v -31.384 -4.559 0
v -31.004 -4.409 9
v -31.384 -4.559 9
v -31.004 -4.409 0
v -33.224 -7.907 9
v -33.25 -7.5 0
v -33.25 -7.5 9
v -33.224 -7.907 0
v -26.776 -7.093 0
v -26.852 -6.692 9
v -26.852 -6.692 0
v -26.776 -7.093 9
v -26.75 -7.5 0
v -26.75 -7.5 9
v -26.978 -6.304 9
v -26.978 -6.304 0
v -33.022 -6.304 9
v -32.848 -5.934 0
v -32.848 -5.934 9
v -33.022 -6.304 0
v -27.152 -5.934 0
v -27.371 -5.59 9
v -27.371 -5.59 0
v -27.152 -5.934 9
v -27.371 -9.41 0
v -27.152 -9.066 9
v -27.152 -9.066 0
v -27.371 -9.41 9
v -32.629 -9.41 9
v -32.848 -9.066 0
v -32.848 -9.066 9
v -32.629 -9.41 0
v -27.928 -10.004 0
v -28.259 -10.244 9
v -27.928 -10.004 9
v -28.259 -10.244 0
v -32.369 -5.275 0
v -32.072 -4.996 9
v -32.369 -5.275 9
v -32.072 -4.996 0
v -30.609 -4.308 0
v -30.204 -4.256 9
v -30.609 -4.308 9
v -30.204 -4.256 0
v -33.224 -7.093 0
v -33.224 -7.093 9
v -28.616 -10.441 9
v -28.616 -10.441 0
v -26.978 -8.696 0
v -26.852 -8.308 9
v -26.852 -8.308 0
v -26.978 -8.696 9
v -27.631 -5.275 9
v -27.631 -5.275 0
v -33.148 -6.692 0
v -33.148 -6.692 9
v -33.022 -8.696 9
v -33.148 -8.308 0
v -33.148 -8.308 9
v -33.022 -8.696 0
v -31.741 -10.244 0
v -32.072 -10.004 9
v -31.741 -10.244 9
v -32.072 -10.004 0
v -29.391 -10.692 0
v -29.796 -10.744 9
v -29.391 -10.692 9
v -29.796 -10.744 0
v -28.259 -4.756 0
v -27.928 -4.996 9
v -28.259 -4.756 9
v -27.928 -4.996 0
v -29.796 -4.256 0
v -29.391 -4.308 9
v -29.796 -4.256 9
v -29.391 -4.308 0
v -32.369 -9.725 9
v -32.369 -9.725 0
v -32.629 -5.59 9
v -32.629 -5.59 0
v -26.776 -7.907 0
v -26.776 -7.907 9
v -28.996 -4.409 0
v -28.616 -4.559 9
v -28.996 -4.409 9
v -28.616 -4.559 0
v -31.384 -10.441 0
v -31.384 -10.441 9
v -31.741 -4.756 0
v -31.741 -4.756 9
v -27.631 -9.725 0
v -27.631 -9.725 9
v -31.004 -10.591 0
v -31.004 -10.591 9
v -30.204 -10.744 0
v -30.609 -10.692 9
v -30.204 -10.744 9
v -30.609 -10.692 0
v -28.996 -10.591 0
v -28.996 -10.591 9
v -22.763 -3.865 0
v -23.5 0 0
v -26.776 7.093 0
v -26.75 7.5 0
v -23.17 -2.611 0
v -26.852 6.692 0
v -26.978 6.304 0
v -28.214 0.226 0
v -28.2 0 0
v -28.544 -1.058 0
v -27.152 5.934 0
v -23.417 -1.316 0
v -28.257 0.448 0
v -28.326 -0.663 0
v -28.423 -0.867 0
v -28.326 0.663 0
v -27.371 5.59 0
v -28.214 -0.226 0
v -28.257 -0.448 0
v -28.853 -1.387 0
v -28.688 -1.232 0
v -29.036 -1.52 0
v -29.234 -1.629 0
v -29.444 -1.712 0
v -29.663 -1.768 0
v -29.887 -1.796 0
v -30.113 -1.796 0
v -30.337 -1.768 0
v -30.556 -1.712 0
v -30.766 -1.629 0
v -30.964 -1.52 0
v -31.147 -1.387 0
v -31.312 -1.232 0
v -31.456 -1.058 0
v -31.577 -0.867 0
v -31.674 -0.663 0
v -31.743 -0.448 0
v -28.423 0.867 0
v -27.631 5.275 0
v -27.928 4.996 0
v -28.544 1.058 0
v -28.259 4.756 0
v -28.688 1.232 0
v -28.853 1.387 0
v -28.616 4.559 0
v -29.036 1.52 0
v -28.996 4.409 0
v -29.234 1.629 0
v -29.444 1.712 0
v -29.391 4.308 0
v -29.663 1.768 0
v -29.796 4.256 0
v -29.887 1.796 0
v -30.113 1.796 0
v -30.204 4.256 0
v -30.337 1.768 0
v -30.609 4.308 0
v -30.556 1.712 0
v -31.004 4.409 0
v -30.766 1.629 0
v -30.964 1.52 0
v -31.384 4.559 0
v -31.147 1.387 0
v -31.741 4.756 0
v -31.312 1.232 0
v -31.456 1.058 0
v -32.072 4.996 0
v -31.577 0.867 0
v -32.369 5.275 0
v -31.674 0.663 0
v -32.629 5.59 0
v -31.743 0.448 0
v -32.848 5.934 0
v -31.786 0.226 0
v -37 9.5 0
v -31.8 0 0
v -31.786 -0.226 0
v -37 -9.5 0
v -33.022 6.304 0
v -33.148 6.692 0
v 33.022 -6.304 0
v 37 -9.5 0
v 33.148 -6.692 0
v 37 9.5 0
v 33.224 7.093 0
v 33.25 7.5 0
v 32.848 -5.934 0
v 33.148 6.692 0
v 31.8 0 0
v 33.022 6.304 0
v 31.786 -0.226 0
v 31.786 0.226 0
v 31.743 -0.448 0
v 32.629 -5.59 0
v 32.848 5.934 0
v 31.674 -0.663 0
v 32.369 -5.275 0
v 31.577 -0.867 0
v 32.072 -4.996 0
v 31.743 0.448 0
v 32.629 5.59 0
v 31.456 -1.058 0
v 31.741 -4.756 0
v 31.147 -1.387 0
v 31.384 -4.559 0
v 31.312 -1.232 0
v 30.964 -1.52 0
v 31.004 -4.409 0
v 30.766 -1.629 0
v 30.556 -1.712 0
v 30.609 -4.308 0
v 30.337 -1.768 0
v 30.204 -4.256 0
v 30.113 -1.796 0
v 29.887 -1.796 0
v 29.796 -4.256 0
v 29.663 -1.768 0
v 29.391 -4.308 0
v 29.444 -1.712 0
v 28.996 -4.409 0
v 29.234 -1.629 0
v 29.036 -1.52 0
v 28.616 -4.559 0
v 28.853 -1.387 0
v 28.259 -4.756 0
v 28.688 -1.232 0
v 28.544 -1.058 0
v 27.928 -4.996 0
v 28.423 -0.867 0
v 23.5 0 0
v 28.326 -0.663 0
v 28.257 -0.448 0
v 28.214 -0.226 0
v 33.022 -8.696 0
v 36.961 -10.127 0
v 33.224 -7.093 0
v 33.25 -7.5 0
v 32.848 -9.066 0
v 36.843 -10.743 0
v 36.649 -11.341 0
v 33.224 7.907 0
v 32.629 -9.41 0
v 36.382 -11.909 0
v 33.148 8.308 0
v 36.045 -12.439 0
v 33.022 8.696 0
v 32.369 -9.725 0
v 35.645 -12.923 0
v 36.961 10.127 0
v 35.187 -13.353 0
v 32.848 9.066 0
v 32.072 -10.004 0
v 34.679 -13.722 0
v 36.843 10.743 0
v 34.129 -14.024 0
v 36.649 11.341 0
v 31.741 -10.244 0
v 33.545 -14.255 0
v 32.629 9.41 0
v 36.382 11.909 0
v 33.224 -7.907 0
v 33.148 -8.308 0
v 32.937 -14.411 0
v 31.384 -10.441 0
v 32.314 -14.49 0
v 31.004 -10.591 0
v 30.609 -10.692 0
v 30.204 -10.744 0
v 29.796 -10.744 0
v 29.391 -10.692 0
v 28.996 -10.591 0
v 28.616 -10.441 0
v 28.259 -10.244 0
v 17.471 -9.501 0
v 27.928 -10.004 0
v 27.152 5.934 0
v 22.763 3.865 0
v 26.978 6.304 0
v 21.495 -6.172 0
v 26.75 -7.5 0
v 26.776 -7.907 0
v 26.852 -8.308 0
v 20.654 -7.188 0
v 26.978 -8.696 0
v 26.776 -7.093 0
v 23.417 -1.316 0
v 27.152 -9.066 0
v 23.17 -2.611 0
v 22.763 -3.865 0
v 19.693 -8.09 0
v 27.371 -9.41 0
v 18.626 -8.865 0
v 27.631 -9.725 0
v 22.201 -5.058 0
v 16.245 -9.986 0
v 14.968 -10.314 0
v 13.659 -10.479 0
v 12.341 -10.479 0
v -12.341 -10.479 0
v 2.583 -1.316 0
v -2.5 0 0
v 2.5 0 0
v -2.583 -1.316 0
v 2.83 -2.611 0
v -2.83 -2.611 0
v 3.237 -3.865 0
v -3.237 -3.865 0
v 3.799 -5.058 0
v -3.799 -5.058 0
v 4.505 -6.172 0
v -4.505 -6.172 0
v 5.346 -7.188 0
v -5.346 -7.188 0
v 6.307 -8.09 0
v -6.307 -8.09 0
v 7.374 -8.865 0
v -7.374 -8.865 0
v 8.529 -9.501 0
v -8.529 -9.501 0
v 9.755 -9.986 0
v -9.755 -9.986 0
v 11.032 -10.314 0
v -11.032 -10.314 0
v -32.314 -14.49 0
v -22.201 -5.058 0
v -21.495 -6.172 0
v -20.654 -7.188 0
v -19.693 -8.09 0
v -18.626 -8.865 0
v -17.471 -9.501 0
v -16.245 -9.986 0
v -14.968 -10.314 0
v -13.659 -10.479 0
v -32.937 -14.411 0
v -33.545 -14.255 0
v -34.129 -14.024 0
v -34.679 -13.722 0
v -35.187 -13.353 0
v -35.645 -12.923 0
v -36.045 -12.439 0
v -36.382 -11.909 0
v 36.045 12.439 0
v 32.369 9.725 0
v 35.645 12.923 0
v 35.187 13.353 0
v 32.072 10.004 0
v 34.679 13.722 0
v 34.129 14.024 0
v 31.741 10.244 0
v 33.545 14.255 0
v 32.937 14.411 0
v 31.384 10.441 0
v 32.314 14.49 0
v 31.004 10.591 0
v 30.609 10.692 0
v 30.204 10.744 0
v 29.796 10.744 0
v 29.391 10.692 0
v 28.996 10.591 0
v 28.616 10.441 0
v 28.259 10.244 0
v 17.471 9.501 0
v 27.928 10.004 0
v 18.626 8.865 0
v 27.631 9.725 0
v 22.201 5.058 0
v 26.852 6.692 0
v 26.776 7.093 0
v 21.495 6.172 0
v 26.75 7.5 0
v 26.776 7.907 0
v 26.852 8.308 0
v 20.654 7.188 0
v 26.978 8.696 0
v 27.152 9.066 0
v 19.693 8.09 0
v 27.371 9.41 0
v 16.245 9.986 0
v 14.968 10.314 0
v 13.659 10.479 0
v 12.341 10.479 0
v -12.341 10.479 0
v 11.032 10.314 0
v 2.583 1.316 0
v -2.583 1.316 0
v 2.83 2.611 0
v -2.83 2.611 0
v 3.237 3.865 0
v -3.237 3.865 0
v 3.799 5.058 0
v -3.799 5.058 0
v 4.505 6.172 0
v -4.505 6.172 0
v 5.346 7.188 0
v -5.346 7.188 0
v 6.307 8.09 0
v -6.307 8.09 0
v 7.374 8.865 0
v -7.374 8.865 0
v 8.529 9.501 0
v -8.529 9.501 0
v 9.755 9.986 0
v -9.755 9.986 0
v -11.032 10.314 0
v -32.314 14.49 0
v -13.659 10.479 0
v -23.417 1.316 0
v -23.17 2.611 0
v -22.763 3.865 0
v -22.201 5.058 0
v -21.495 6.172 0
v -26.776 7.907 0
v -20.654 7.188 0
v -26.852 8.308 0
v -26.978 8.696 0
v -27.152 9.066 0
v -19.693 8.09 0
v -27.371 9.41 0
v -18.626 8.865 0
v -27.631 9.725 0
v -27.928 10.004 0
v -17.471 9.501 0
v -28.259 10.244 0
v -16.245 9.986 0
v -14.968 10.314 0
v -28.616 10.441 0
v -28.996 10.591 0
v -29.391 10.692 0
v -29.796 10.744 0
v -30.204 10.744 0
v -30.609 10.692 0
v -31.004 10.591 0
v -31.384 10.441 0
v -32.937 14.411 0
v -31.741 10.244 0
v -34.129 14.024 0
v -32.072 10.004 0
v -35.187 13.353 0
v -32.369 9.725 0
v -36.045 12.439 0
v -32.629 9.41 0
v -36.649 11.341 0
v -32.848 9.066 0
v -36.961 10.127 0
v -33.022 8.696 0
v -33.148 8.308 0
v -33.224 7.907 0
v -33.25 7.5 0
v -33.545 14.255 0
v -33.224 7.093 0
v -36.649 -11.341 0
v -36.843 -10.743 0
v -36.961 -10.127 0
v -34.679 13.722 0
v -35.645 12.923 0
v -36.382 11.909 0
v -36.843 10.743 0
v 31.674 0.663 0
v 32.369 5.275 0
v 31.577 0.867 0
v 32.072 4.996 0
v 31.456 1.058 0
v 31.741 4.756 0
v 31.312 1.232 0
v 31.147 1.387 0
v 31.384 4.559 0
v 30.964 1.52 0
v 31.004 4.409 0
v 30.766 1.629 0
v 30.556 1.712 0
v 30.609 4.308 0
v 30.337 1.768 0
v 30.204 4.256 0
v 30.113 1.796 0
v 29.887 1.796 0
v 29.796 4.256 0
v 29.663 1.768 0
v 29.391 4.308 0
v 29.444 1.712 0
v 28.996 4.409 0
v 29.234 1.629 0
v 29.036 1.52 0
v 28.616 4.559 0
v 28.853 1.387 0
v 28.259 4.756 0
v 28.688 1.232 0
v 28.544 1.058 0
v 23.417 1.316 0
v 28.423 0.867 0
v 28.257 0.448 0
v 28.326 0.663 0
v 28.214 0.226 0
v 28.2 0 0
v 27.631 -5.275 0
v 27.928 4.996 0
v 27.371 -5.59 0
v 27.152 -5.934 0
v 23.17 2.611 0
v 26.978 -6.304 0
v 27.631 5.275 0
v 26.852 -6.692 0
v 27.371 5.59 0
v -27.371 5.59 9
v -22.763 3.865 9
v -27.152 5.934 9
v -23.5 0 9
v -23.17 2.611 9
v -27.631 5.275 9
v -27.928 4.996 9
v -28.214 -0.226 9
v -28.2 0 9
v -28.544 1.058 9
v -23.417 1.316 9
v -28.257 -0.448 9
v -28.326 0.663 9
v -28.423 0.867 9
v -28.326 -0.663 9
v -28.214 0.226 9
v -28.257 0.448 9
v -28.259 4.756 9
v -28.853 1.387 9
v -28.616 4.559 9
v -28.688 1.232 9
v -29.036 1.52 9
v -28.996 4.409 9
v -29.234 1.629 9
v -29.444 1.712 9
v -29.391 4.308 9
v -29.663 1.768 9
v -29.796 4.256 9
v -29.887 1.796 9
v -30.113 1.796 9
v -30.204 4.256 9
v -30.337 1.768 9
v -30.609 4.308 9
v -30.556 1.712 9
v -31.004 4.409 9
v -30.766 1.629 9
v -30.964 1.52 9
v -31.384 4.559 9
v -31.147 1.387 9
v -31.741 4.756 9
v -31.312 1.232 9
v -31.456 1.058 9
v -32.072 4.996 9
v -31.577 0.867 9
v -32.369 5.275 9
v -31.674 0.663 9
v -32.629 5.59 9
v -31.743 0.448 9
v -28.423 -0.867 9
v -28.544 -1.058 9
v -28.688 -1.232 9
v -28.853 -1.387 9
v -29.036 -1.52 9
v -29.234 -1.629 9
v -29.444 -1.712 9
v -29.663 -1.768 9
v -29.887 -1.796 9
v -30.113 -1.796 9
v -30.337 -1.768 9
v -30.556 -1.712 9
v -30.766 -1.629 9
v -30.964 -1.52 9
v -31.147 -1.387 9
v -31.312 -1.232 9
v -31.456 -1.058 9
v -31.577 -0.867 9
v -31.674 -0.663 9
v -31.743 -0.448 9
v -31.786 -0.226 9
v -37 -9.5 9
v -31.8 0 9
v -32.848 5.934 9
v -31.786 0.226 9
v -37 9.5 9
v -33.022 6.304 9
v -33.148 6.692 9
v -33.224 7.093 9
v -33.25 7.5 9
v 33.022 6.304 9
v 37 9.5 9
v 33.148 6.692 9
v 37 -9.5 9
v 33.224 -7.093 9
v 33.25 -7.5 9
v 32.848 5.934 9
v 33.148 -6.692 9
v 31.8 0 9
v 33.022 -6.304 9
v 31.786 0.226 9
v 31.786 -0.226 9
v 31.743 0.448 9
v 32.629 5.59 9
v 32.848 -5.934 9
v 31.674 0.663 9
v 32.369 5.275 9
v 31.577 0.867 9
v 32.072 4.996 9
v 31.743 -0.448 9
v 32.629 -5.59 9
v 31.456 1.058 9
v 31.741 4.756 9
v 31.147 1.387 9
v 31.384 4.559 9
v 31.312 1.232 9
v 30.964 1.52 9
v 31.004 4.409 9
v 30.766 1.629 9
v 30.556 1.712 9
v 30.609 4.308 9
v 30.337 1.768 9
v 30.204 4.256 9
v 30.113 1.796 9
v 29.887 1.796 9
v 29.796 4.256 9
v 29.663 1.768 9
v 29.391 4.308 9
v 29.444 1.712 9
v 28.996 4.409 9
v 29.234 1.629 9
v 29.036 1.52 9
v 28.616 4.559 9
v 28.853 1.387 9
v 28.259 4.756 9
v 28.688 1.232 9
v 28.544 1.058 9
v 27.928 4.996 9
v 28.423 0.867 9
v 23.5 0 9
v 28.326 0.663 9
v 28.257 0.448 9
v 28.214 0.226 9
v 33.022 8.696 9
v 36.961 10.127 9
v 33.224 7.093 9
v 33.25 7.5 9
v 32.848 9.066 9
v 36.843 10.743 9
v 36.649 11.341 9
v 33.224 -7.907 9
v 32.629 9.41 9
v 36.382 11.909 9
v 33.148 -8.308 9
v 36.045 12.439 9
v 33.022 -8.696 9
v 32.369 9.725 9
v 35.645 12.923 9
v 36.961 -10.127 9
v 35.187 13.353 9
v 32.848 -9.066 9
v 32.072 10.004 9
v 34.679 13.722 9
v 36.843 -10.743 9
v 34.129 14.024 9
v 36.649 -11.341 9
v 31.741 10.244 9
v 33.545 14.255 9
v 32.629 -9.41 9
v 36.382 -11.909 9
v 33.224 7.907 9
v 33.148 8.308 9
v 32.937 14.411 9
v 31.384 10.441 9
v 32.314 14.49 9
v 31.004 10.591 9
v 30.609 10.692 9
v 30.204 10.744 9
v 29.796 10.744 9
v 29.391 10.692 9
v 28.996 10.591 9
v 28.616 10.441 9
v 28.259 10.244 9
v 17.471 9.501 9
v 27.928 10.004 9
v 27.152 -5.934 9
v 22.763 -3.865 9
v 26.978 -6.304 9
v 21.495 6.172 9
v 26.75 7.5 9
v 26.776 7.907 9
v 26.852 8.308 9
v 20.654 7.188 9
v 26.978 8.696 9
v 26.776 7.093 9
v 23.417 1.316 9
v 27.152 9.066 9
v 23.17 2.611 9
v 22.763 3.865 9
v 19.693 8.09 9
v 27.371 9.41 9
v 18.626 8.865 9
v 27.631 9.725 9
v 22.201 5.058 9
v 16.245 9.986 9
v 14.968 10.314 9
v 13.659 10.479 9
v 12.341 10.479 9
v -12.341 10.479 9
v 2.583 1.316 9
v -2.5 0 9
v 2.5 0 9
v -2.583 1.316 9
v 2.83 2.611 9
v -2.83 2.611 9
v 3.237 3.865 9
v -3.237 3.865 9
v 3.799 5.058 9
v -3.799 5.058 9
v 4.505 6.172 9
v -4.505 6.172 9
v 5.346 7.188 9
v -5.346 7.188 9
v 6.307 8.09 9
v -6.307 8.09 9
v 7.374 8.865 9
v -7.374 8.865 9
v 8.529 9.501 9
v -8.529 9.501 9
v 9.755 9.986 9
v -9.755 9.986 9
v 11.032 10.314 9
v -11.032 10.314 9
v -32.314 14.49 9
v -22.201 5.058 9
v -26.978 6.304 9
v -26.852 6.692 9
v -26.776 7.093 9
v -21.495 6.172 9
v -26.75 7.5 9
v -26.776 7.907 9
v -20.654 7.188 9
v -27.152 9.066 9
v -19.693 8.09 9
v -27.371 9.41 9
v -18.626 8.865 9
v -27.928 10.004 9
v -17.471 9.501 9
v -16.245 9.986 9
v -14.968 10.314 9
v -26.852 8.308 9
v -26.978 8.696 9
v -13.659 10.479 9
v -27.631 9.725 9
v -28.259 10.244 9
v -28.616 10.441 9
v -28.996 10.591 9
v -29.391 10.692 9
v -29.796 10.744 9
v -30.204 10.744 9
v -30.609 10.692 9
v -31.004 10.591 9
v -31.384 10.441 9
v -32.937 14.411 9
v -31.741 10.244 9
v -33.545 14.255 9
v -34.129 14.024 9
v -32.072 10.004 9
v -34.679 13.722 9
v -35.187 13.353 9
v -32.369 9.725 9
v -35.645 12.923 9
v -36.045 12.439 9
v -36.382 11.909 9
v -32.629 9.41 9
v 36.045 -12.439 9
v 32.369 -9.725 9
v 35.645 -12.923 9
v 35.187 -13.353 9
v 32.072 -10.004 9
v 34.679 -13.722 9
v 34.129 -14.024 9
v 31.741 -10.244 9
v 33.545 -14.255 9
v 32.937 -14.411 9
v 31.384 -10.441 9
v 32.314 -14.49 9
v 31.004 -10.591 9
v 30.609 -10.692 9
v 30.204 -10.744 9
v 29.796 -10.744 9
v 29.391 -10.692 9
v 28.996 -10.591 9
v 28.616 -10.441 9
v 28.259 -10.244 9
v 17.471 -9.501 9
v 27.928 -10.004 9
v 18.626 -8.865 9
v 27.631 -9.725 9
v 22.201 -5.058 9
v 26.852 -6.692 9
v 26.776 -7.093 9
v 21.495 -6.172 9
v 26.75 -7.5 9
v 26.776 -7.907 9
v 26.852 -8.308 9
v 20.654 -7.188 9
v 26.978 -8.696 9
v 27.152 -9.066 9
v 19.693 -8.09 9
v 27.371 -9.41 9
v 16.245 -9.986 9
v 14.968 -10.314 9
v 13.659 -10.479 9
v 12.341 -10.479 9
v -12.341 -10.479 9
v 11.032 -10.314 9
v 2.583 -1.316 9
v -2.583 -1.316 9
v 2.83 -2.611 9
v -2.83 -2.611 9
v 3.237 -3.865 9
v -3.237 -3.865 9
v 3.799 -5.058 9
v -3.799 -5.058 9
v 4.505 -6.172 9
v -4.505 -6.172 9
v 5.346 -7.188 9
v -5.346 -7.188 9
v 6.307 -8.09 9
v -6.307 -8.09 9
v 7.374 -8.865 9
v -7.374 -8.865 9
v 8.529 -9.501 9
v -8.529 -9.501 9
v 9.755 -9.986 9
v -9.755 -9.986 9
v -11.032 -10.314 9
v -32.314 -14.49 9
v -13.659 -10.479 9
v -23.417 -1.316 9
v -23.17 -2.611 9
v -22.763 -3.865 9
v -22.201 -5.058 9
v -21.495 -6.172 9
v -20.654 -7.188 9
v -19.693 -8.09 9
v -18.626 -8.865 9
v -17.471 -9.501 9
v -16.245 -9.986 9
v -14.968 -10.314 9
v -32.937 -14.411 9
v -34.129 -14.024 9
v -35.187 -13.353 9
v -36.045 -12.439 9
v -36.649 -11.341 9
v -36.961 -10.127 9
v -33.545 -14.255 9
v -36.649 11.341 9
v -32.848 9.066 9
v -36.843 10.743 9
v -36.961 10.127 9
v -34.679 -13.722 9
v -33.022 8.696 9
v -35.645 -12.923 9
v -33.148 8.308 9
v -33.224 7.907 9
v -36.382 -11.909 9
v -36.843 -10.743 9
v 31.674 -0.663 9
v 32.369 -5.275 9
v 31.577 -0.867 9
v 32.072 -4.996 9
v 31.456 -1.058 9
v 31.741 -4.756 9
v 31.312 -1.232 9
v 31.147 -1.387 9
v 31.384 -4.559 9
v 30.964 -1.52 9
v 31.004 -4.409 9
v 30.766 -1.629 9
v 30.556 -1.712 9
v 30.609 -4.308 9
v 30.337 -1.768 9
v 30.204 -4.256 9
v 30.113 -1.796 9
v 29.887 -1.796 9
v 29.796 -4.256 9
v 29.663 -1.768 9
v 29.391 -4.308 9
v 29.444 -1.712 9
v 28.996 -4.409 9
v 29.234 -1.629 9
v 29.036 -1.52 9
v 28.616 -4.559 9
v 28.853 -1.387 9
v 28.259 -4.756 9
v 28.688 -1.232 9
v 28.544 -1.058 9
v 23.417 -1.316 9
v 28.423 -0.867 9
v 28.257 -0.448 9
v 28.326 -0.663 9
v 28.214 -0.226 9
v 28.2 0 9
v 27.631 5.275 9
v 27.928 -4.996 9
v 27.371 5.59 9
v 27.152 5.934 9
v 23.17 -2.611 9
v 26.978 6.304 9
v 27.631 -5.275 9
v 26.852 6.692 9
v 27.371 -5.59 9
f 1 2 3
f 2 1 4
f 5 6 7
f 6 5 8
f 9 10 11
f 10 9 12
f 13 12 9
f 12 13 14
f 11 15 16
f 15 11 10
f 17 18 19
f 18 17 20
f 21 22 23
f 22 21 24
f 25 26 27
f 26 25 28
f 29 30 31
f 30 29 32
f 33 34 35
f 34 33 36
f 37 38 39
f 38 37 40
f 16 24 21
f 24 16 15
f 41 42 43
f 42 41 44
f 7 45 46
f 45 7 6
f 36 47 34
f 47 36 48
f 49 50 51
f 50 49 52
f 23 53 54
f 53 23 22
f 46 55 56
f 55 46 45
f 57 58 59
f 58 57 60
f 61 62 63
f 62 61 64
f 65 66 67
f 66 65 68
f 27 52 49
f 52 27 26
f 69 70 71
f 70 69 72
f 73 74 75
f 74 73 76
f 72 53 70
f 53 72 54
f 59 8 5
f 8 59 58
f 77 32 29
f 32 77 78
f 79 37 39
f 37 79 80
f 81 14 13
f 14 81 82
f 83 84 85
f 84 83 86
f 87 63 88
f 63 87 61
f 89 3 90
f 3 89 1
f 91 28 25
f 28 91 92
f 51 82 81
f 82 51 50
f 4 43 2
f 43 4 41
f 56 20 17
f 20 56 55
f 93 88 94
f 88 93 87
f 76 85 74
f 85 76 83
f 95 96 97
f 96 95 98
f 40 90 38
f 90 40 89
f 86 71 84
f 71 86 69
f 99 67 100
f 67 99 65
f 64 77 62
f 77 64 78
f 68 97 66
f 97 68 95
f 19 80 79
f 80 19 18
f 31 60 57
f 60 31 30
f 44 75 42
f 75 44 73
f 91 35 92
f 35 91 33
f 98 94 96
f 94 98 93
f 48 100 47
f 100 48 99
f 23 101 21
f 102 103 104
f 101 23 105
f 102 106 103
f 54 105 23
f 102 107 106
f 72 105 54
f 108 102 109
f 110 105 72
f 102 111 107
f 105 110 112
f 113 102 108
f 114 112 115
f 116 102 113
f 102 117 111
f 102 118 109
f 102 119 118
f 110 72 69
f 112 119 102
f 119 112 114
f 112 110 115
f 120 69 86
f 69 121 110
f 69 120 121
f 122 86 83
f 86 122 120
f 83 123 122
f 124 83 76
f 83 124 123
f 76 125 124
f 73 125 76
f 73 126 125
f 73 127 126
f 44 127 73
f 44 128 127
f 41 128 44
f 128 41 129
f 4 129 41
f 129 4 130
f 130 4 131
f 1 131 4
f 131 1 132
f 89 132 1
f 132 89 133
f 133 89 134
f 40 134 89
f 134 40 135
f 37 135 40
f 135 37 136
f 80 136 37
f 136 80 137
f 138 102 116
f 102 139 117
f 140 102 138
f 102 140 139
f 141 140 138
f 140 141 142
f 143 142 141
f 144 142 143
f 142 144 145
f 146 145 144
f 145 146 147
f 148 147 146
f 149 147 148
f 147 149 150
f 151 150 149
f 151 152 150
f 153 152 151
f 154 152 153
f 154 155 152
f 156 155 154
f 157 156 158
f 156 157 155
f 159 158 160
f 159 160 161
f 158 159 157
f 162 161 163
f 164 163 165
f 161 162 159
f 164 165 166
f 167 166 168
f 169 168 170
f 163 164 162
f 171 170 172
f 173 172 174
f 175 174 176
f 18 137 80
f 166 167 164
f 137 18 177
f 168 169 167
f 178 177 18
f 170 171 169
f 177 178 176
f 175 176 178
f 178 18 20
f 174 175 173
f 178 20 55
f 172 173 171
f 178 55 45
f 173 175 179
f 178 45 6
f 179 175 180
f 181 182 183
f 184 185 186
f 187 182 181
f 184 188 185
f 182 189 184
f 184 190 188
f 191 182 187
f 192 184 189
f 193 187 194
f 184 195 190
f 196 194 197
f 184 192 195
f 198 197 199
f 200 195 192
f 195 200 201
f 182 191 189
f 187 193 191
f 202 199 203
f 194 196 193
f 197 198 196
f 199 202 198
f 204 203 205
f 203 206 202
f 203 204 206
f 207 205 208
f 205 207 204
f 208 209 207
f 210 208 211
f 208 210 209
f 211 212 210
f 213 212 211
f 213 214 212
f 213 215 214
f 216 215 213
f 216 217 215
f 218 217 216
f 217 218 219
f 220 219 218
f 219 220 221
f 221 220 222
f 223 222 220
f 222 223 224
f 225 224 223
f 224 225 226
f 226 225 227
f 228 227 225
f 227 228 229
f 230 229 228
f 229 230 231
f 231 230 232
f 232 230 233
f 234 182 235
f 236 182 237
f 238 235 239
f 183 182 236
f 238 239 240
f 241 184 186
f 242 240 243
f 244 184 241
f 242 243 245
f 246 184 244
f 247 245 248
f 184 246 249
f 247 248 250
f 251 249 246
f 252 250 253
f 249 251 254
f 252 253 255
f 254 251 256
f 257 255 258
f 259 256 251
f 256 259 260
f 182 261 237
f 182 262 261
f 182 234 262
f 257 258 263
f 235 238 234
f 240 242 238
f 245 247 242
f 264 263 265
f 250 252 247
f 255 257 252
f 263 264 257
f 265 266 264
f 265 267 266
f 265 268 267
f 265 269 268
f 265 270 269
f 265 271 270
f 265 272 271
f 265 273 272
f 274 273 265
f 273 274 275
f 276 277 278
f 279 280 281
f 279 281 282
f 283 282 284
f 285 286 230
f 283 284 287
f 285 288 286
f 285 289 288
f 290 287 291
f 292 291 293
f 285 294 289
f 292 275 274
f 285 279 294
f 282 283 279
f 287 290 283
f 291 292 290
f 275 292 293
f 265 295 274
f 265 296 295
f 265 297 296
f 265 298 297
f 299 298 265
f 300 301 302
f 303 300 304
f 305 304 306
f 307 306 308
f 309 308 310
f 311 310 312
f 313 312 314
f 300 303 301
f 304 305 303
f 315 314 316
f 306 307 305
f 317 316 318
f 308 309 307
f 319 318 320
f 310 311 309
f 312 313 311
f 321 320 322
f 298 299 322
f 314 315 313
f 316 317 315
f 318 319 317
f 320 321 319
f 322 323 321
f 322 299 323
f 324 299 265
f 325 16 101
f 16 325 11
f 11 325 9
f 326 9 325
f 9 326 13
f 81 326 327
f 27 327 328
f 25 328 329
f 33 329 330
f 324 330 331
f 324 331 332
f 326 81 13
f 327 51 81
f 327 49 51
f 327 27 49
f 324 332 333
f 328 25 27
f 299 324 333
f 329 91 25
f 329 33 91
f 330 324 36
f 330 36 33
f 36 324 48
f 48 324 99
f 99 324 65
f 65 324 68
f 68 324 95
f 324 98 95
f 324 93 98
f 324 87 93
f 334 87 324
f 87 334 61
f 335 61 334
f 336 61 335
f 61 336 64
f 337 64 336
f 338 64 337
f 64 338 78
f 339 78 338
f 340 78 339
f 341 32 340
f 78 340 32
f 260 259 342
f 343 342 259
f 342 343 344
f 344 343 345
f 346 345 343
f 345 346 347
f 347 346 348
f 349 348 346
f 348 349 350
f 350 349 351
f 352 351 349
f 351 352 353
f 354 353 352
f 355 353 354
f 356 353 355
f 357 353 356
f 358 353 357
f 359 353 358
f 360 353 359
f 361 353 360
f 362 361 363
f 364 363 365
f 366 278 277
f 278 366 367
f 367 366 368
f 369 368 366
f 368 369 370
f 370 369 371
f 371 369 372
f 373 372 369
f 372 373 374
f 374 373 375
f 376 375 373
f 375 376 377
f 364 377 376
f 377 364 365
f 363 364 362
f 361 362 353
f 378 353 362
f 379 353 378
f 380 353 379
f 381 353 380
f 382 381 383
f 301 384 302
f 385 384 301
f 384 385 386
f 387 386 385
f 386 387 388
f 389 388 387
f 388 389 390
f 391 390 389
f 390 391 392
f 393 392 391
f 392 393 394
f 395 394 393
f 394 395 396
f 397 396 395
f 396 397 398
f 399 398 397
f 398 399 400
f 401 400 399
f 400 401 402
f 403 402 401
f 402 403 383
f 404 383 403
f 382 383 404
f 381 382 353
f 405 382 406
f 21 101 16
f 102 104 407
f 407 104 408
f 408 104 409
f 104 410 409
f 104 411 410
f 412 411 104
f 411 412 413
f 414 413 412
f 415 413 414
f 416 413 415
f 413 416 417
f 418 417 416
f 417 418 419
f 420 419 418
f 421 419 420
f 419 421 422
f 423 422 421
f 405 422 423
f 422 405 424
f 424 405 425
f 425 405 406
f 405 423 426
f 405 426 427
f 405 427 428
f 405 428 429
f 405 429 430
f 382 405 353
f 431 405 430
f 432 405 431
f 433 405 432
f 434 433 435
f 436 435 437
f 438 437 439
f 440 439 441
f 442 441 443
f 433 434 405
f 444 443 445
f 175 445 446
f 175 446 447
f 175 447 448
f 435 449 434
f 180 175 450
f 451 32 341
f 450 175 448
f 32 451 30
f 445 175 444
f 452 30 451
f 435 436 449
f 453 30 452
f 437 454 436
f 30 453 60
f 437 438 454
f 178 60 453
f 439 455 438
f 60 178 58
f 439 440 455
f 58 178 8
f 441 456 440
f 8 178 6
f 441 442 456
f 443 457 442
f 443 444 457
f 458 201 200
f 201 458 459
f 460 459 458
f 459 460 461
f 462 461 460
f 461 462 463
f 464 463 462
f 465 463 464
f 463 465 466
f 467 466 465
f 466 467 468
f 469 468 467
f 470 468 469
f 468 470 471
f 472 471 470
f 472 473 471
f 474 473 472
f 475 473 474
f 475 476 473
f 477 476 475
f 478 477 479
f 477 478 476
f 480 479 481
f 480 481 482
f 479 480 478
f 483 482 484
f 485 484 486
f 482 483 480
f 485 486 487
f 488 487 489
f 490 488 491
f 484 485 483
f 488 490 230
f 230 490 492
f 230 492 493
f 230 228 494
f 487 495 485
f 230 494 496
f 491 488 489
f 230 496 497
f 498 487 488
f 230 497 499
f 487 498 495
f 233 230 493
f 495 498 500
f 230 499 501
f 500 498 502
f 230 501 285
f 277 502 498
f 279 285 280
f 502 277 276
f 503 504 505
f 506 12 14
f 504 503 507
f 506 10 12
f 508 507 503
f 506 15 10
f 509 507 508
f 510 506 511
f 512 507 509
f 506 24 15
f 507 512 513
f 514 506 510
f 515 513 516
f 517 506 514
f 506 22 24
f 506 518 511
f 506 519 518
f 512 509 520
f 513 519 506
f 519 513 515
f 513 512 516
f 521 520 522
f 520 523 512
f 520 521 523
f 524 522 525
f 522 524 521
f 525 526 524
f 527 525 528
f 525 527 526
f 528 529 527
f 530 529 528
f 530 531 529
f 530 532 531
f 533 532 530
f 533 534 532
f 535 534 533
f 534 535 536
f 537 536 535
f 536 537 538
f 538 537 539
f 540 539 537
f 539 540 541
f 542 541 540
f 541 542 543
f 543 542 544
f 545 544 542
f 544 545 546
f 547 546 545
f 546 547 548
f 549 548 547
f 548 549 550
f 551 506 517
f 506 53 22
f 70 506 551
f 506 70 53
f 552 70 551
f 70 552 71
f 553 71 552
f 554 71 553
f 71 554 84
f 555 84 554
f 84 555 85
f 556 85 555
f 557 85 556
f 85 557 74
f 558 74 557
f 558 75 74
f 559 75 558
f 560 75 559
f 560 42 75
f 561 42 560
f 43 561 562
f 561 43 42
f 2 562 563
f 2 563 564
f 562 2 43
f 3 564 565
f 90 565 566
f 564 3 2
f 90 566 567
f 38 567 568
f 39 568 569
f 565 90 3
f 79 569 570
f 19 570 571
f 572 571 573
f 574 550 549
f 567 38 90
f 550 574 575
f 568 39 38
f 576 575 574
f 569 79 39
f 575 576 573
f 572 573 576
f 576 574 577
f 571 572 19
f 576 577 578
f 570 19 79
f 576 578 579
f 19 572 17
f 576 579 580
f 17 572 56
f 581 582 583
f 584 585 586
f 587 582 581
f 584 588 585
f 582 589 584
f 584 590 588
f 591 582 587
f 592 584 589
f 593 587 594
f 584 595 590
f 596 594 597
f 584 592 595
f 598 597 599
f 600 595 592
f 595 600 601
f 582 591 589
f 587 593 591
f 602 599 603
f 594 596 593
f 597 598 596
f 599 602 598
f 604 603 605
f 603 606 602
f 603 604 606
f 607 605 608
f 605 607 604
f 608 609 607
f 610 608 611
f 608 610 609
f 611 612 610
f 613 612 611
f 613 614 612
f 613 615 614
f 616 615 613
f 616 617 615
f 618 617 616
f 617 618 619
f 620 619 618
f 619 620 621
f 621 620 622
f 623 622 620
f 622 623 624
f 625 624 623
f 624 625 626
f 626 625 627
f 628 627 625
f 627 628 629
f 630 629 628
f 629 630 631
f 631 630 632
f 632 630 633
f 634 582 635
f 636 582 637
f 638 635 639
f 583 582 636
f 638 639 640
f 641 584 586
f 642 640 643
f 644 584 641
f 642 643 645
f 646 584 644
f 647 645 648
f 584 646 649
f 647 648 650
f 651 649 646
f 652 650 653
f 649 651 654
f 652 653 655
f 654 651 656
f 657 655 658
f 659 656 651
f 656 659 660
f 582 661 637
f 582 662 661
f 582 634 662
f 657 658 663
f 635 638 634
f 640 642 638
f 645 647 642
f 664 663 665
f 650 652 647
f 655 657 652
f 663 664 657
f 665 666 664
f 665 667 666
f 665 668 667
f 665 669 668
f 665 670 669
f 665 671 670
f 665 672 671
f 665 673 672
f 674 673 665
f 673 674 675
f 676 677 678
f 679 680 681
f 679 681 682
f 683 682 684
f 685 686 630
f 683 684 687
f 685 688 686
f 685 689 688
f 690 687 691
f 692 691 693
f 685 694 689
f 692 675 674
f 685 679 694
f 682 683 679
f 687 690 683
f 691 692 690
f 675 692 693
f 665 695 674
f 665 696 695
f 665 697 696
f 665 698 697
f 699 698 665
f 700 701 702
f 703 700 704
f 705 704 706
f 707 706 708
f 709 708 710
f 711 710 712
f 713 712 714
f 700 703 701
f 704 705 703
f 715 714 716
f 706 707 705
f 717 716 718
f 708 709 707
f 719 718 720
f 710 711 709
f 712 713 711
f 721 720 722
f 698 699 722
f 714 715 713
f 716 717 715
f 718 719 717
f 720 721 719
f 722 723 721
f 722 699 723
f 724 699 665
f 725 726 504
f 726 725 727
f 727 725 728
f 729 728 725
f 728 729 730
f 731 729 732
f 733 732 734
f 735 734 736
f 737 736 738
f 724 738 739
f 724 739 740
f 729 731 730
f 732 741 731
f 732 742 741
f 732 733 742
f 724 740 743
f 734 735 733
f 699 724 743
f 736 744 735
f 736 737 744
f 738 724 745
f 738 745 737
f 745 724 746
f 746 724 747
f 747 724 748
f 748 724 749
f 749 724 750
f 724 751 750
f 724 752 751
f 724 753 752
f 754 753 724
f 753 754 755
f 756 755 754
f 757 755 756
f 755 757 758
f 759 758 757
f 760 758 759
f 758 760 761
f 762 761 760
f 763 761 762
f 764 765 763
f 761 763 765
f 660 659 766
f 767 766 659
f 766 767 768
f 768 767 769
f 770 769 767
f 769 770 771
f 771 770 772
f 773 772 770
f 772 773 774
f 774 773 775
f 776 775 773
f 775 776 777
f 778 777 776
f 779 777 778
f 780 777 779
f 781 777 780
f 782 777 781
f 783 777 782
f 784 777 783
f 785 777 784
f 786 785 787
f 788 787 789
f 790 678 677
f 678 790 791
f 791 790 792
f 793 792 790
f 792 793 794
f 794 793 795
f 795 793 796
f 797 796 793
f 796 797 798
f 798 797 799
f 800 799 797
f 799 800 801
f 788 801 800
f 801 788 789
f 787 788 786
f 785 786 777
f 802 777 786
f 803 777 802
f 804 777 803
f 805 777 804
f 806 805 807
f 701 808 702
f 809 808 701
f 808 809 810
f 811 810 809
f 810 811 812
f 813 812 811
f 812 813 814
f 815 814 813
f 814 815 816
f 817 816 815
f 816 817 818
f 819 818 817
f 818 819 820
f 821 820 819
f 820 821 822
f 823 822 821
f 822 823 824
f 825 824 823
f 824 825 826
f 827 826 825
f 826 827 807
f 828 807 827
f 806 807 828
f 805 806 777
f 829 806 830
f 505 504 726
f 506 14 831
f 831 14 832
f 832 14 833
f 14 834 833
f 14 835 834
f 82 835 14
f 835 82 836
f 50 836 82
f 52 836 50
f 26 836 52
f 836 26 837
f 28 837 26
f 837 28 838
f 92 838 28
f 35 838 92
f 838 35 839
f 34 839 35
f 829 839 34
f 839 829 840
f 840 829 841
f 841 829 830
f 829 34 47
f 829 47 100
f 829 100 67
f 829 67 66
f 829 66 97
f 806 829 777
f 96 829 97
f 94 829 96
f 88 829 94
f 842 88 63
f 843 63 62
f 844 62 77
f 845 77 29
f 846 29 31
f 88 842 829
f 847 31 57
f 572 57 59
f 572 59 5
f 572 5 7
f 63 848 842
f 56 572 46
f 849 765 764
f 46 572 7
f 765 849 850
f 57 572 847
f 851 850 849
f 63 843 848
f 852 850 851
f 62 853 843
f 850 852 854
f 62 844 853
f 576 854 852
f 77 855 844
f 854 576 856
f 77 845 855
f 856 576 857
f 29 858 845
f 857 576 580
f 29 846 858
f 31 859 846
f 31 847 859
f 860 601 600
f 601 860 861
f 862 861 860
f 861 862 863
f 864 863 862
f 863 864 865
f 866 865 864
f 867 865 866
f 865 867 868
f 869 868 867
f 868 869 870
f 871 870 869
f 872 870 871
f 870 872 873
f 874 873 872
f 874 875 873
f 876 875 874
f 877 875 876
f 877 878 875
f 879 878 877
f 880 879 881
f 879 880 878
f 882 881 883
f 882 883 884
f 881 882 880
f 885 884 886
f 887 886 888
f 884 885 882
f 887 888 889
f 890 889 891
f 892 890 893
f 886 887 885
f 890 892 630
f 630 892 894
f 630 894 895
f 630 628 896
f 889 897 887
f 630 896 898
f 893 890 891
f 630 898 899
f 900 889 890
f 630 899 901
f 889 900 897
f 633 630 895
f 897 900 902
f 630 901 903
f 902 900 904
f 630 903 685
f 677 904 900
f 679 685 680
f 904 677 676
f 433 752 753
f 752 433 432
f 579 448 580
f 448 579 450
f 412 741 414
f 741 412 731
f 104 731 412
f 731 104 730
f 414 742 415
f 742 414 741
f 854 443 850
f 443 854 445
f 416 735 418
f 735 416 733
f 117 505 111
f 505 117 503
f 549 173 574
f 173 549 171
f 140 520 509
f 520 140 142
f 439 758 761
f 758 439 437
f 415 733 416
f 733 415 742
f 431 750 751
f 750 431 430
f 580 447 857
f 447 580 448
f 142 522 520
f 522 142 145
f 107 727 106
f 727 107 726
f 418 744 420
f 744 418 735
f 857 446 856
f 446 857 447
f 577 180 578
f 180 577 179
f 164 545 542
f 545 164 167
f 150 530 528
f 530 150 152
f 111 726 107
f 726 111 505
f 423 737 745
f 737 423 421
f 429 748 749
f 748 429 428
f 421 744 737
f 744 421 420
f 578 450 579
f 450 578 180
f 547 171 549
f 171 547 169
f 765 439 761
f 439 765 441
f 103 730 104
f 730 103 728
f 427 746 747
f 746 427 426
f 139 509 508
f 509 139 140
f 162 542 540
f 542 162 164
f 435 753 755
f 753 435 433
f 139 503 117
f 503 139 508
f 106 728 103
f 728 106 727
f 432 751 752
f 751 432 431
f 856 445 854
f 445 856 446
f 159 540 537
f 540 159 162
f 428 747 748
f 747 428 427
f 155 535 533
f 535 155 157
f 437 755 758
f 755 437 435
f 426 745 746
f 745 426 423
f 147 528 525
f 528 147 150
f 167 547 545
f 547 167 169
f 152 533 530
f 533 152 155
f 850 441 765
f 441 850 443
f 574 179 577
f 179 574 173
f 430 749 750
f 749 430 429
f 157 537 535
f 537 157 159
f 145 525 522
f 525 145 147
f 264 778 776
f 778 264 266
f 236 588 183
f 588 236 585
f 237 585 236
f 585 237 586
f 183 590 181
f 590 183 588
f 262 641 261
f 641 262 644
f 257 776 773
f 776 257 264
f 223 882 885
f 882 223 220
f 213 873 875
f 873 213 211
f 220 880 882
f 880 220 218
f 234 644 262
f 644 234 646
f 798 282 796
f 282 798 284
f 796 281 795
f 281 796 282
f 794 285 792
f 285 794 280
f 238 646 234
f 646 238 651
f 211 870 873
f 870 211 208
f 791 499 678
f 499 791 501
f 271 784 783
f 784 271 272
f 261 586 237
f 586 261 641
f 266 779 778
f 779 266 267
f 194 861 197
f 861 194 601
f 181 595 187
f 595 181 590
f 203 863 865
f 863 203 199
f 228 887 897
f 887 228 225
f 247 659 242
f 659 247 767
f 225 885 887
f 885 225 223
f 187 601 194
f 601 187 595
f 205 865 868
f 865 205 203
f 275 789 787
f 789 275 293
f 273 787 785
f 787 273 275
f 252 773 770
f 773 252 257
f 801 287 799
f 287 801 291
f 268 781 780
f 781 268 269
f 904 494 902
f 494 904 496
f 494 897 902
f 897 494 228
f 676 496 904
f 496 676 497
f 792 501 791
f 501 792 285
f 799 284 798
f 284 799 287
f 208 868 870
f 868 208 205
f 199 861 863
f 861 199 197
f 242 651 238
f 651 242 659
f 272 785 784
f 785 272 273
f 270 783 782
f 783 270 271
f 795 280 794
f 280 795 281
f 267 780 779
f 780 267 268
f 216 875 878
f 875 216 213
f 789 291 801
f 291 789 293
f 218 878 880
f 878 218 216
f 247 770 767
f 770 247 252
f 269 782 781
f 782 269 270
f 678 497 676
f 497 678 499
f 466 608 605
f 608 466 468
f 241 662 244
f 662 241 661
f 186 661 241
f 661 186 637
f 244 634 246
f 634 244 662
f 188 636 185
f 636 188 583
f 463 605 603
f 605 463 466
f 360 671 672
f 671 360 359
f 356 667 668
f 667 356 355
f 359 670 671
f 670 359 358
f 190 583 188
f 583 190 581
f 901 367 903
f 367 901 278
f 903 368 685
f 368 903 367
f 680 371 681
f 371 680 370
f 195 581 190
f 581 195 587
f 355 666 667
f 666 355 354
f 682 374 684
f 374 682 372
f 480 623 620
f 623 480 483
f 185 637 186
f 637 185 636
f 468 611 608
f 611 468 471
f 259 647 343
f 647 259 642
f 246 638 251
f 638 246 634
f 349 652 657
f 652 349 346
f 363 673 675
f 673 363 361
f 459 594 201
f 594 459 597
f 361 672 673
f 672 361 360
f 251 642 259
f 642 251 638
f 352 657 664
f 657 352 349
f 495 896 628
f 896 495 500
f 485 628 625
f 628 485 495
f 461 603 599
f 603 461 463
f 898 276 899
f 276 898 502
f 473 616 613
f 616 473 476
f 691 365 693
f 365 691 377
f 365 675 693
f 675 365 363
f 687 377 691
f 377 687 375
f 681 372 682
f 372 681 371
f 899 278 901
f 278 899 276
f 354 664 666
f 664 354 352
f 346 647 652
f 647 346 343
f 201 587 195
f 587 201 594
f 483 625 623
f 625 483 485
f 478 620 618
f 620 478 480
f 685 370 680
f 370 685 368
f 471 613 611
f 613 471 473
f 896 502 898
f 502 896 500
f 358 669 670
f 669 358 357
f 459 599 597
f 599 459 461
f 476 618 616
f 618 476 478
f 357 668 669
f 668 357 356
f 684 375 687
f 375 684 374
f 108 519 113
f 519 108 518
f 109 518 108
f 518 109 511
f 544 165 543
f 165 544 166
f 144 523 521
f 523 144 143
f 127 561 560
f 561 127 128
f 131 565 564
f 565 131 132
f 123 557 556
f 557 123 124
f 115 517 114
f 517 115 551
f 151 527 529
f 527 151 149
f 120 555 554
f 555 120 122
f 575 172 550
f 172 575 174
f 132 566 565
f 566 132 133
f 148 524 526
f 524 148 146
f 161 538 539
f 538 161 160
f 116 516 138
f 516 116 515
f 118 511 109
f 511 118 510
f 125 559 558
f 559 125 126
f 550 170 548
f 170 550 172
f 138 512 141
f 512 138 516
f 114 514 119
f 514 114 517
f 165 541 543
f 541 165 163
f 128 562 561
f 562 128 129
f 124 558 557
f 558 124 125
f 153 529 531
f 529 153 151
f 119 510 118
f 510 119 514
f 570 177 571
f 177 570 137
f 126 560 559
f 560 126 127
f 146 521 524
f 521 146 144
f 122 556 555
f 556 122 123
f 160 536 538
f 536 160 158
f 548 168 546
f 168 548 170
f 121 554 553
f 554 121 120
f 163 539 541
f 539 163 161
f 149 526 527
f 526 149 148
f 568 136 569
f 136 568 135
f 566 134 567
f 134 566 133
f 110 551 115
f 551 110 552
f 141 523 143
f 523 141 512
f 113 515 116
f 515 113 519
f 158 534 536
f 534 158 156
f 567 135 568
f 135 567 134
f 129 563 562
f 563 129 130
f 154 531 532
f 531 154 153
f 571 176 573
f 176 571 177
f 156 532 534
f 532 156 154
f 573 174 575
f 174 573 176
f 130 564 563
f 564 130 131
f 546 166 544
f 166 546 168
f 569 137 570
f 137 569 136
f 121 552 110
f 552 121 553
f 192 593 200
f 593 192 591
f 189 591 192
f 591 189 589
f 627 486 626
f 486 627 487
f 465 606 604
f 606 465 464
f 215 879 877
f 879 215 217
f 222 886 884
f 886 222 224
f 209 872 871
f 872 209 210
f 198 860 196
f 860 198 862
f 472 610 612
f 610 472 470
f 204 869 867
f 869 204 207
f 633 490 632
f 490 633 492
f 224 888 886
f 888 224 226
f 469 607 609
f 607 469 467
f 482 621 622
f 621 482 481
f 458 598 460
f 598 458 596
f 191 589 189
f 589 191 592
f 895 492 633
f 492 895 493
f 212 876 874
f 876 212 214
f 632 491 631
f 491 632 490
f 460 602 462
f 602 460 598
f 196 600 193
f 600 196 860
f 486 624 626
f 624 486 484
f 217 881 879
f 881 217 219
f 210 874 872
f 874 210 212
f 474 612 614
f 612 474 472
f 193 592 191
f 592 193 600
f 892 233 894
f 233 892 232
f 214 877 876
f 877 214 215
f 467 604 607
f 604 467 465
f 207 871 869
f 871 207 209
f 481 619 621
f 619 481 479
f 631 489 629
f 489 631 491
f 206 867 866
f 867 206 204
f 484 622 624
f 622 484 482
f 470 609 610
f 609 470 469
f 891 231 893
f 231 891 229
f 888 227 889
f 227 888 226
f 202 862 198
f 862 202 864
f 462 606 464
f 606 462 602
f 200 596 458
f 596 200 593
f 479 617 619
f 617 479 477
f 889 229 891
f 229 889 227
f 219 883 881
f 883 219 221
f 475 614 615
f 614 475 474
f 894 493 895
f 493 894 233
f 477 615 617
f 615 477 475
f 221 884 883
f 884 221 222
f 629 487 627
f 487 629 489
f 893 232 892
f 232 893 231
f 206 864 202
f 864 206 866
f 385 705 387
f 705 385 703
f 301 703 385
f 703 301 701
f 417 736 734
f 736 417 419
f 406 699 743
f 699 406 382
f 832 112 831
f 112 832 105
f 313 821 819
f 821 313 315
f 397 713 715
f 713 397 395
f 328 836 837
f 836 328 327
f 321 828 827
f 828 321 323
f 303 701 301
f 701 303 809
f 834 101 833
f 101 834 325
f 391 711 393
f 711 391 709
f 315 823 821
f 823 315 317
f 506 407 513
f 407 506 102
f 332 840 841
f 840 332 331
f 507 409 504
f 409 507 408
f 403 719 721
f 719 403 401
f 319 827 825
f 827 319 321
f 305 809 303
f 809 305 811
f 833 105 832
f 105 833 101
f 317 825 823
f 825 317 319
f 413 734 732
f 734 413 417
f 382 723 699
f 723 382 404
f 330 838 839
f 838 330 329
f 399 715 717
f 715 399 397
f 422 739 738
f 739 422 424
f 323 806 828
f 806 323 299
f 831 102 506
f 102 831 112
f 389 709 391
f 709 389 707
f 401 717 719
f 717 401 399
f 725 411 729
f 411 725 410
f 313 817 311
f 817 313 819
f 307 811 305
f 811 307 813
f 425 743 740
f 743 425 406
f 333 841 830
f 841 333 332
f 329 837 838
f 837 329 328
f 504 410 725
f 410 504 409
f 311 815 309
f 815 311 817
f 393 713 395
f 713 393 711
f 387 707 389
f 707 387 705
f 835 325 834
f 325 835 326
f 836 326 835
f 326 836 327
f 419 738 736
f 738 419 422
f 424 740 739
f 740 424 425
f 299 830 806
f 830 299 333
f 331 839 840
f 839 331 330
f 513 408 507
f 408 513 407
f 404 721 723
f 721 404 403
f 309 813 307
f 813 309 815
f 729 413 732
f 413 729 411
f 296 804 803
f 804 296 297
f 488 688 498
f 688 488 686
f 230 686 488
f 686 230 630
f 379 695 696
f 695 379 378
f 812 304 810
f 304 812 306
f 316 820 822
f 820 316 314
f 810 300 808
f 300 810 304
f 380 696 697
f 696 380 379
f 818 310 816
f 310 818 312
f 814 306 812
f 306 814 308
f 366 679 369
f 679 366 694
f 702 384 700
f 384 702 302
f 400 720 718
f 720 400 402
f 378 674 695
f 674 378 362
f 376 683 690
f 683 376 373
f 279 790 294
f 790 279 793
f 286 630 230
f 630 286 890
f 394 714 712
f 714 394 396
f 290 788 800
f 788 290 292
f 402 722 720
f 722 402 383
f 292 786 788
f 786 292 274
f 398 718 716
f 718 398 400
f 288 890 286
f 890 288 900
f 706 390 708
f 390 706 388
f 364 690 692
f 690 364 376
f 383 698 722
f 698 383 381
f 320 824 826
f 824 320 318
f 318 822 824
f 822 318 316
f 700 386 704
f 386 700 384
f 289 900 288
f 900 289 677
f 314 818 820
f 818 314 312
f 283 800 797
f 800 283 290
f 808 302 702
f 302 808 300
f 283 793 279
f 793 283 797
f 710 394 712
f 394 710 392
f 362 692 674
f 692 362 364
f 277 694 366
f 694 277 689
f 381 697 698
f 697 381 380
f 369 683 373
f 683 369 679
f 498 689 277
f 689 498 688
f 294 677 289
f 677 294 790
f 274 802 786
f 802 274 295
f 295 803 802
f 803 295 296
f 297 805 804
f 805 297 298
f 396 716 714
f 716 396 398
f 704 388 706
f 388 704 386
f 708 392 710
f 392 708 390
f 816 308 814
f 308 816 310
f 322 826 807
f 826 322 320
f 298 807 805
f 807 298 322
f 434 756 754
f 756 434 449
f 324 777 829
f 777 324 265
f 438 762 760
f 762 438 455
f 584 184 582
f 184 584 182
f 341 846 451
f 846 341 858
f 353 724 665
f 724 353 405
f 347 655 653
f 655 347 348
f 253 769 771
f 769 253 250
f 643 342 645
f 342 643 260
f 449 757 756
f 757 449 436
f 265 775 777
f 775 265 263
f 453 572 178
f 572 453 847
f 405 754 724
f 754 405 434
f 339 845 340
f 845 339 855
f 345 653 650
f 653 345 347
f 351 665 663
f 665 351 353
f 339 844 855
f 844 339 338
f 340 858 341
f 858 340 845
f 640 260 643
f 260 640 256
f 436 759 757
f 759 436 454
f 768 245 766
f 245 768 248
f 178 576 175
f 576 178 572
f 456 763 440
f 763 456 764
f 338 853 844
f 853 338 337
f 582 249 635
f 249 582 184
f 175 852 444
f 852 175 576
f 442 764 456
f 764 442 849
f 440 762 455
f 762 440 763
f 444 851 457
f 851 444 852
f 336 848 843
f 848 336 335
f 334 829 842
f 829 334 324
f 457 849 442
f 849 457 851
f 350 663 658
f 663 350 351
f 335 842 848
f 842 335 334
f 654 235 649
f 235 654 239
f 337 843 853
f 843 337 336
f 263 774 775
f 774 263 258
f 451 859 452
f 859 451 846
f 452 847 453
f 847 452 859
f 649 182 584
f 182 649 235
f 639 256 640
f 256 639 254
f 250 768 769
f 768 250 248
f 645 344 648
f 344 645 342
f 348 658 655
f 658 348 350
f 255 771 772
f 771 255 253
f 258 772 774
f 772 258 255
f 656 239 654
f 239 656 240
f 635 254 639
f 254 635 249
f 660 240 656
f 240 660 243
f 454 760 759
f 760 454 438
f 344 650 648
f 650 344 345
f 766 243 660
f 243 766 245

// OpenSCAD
$fn = 50;

difference() {
	union() {
		hull() {
			translate(v = [-32.0, 9.5, 0]) {
				cylinder(h = 9, r = 5);
			}
			translate(v = [32.0, 9.5, 0]) {
				cylinder(h = 9, r = 5);
			}
			translate(v = [-32.0, -9.5, 0]) {
				cylinder(h = 9, r = 5);
			}
			translate(v = [32.0, -9.5, 0]) {
				cylinder(h = 9, r = 5);
			}
		}
	}
	union() {
		translate(v = [-30.0, -7.5, 0]) {
			cylinder(h = 9, r = 3.25);
		}
		translate(v = [-30.0, 7.5, 0]) {
			cylinder(h = 9, r = 3.25);
		}
		translate(v = [30.0, -7.5, 0]) {
			cylinder(h = 9, r = 3.25);
		}
		translate(v = [30.0, 7.5, 0]) {
			cylinder(h = 9, r = 3.25);
		}
		translate(v = [-30.0, 0.0, 0]) {
			cylinder(h = 9, r = 1.8);
		}
		translate(v = [30.0, 0.0, 0]) {
			cylinder(h = 9, r = 1.8);
		}
		translate(v = [-13.0, 0, 0.0]) {
			cylinder(h = 9, r = 10.5);
		}
		translate(v = [13.0, 0, 0.0]) {
			cylinder(h = 9, r = 10.5);
		}
	}
}
